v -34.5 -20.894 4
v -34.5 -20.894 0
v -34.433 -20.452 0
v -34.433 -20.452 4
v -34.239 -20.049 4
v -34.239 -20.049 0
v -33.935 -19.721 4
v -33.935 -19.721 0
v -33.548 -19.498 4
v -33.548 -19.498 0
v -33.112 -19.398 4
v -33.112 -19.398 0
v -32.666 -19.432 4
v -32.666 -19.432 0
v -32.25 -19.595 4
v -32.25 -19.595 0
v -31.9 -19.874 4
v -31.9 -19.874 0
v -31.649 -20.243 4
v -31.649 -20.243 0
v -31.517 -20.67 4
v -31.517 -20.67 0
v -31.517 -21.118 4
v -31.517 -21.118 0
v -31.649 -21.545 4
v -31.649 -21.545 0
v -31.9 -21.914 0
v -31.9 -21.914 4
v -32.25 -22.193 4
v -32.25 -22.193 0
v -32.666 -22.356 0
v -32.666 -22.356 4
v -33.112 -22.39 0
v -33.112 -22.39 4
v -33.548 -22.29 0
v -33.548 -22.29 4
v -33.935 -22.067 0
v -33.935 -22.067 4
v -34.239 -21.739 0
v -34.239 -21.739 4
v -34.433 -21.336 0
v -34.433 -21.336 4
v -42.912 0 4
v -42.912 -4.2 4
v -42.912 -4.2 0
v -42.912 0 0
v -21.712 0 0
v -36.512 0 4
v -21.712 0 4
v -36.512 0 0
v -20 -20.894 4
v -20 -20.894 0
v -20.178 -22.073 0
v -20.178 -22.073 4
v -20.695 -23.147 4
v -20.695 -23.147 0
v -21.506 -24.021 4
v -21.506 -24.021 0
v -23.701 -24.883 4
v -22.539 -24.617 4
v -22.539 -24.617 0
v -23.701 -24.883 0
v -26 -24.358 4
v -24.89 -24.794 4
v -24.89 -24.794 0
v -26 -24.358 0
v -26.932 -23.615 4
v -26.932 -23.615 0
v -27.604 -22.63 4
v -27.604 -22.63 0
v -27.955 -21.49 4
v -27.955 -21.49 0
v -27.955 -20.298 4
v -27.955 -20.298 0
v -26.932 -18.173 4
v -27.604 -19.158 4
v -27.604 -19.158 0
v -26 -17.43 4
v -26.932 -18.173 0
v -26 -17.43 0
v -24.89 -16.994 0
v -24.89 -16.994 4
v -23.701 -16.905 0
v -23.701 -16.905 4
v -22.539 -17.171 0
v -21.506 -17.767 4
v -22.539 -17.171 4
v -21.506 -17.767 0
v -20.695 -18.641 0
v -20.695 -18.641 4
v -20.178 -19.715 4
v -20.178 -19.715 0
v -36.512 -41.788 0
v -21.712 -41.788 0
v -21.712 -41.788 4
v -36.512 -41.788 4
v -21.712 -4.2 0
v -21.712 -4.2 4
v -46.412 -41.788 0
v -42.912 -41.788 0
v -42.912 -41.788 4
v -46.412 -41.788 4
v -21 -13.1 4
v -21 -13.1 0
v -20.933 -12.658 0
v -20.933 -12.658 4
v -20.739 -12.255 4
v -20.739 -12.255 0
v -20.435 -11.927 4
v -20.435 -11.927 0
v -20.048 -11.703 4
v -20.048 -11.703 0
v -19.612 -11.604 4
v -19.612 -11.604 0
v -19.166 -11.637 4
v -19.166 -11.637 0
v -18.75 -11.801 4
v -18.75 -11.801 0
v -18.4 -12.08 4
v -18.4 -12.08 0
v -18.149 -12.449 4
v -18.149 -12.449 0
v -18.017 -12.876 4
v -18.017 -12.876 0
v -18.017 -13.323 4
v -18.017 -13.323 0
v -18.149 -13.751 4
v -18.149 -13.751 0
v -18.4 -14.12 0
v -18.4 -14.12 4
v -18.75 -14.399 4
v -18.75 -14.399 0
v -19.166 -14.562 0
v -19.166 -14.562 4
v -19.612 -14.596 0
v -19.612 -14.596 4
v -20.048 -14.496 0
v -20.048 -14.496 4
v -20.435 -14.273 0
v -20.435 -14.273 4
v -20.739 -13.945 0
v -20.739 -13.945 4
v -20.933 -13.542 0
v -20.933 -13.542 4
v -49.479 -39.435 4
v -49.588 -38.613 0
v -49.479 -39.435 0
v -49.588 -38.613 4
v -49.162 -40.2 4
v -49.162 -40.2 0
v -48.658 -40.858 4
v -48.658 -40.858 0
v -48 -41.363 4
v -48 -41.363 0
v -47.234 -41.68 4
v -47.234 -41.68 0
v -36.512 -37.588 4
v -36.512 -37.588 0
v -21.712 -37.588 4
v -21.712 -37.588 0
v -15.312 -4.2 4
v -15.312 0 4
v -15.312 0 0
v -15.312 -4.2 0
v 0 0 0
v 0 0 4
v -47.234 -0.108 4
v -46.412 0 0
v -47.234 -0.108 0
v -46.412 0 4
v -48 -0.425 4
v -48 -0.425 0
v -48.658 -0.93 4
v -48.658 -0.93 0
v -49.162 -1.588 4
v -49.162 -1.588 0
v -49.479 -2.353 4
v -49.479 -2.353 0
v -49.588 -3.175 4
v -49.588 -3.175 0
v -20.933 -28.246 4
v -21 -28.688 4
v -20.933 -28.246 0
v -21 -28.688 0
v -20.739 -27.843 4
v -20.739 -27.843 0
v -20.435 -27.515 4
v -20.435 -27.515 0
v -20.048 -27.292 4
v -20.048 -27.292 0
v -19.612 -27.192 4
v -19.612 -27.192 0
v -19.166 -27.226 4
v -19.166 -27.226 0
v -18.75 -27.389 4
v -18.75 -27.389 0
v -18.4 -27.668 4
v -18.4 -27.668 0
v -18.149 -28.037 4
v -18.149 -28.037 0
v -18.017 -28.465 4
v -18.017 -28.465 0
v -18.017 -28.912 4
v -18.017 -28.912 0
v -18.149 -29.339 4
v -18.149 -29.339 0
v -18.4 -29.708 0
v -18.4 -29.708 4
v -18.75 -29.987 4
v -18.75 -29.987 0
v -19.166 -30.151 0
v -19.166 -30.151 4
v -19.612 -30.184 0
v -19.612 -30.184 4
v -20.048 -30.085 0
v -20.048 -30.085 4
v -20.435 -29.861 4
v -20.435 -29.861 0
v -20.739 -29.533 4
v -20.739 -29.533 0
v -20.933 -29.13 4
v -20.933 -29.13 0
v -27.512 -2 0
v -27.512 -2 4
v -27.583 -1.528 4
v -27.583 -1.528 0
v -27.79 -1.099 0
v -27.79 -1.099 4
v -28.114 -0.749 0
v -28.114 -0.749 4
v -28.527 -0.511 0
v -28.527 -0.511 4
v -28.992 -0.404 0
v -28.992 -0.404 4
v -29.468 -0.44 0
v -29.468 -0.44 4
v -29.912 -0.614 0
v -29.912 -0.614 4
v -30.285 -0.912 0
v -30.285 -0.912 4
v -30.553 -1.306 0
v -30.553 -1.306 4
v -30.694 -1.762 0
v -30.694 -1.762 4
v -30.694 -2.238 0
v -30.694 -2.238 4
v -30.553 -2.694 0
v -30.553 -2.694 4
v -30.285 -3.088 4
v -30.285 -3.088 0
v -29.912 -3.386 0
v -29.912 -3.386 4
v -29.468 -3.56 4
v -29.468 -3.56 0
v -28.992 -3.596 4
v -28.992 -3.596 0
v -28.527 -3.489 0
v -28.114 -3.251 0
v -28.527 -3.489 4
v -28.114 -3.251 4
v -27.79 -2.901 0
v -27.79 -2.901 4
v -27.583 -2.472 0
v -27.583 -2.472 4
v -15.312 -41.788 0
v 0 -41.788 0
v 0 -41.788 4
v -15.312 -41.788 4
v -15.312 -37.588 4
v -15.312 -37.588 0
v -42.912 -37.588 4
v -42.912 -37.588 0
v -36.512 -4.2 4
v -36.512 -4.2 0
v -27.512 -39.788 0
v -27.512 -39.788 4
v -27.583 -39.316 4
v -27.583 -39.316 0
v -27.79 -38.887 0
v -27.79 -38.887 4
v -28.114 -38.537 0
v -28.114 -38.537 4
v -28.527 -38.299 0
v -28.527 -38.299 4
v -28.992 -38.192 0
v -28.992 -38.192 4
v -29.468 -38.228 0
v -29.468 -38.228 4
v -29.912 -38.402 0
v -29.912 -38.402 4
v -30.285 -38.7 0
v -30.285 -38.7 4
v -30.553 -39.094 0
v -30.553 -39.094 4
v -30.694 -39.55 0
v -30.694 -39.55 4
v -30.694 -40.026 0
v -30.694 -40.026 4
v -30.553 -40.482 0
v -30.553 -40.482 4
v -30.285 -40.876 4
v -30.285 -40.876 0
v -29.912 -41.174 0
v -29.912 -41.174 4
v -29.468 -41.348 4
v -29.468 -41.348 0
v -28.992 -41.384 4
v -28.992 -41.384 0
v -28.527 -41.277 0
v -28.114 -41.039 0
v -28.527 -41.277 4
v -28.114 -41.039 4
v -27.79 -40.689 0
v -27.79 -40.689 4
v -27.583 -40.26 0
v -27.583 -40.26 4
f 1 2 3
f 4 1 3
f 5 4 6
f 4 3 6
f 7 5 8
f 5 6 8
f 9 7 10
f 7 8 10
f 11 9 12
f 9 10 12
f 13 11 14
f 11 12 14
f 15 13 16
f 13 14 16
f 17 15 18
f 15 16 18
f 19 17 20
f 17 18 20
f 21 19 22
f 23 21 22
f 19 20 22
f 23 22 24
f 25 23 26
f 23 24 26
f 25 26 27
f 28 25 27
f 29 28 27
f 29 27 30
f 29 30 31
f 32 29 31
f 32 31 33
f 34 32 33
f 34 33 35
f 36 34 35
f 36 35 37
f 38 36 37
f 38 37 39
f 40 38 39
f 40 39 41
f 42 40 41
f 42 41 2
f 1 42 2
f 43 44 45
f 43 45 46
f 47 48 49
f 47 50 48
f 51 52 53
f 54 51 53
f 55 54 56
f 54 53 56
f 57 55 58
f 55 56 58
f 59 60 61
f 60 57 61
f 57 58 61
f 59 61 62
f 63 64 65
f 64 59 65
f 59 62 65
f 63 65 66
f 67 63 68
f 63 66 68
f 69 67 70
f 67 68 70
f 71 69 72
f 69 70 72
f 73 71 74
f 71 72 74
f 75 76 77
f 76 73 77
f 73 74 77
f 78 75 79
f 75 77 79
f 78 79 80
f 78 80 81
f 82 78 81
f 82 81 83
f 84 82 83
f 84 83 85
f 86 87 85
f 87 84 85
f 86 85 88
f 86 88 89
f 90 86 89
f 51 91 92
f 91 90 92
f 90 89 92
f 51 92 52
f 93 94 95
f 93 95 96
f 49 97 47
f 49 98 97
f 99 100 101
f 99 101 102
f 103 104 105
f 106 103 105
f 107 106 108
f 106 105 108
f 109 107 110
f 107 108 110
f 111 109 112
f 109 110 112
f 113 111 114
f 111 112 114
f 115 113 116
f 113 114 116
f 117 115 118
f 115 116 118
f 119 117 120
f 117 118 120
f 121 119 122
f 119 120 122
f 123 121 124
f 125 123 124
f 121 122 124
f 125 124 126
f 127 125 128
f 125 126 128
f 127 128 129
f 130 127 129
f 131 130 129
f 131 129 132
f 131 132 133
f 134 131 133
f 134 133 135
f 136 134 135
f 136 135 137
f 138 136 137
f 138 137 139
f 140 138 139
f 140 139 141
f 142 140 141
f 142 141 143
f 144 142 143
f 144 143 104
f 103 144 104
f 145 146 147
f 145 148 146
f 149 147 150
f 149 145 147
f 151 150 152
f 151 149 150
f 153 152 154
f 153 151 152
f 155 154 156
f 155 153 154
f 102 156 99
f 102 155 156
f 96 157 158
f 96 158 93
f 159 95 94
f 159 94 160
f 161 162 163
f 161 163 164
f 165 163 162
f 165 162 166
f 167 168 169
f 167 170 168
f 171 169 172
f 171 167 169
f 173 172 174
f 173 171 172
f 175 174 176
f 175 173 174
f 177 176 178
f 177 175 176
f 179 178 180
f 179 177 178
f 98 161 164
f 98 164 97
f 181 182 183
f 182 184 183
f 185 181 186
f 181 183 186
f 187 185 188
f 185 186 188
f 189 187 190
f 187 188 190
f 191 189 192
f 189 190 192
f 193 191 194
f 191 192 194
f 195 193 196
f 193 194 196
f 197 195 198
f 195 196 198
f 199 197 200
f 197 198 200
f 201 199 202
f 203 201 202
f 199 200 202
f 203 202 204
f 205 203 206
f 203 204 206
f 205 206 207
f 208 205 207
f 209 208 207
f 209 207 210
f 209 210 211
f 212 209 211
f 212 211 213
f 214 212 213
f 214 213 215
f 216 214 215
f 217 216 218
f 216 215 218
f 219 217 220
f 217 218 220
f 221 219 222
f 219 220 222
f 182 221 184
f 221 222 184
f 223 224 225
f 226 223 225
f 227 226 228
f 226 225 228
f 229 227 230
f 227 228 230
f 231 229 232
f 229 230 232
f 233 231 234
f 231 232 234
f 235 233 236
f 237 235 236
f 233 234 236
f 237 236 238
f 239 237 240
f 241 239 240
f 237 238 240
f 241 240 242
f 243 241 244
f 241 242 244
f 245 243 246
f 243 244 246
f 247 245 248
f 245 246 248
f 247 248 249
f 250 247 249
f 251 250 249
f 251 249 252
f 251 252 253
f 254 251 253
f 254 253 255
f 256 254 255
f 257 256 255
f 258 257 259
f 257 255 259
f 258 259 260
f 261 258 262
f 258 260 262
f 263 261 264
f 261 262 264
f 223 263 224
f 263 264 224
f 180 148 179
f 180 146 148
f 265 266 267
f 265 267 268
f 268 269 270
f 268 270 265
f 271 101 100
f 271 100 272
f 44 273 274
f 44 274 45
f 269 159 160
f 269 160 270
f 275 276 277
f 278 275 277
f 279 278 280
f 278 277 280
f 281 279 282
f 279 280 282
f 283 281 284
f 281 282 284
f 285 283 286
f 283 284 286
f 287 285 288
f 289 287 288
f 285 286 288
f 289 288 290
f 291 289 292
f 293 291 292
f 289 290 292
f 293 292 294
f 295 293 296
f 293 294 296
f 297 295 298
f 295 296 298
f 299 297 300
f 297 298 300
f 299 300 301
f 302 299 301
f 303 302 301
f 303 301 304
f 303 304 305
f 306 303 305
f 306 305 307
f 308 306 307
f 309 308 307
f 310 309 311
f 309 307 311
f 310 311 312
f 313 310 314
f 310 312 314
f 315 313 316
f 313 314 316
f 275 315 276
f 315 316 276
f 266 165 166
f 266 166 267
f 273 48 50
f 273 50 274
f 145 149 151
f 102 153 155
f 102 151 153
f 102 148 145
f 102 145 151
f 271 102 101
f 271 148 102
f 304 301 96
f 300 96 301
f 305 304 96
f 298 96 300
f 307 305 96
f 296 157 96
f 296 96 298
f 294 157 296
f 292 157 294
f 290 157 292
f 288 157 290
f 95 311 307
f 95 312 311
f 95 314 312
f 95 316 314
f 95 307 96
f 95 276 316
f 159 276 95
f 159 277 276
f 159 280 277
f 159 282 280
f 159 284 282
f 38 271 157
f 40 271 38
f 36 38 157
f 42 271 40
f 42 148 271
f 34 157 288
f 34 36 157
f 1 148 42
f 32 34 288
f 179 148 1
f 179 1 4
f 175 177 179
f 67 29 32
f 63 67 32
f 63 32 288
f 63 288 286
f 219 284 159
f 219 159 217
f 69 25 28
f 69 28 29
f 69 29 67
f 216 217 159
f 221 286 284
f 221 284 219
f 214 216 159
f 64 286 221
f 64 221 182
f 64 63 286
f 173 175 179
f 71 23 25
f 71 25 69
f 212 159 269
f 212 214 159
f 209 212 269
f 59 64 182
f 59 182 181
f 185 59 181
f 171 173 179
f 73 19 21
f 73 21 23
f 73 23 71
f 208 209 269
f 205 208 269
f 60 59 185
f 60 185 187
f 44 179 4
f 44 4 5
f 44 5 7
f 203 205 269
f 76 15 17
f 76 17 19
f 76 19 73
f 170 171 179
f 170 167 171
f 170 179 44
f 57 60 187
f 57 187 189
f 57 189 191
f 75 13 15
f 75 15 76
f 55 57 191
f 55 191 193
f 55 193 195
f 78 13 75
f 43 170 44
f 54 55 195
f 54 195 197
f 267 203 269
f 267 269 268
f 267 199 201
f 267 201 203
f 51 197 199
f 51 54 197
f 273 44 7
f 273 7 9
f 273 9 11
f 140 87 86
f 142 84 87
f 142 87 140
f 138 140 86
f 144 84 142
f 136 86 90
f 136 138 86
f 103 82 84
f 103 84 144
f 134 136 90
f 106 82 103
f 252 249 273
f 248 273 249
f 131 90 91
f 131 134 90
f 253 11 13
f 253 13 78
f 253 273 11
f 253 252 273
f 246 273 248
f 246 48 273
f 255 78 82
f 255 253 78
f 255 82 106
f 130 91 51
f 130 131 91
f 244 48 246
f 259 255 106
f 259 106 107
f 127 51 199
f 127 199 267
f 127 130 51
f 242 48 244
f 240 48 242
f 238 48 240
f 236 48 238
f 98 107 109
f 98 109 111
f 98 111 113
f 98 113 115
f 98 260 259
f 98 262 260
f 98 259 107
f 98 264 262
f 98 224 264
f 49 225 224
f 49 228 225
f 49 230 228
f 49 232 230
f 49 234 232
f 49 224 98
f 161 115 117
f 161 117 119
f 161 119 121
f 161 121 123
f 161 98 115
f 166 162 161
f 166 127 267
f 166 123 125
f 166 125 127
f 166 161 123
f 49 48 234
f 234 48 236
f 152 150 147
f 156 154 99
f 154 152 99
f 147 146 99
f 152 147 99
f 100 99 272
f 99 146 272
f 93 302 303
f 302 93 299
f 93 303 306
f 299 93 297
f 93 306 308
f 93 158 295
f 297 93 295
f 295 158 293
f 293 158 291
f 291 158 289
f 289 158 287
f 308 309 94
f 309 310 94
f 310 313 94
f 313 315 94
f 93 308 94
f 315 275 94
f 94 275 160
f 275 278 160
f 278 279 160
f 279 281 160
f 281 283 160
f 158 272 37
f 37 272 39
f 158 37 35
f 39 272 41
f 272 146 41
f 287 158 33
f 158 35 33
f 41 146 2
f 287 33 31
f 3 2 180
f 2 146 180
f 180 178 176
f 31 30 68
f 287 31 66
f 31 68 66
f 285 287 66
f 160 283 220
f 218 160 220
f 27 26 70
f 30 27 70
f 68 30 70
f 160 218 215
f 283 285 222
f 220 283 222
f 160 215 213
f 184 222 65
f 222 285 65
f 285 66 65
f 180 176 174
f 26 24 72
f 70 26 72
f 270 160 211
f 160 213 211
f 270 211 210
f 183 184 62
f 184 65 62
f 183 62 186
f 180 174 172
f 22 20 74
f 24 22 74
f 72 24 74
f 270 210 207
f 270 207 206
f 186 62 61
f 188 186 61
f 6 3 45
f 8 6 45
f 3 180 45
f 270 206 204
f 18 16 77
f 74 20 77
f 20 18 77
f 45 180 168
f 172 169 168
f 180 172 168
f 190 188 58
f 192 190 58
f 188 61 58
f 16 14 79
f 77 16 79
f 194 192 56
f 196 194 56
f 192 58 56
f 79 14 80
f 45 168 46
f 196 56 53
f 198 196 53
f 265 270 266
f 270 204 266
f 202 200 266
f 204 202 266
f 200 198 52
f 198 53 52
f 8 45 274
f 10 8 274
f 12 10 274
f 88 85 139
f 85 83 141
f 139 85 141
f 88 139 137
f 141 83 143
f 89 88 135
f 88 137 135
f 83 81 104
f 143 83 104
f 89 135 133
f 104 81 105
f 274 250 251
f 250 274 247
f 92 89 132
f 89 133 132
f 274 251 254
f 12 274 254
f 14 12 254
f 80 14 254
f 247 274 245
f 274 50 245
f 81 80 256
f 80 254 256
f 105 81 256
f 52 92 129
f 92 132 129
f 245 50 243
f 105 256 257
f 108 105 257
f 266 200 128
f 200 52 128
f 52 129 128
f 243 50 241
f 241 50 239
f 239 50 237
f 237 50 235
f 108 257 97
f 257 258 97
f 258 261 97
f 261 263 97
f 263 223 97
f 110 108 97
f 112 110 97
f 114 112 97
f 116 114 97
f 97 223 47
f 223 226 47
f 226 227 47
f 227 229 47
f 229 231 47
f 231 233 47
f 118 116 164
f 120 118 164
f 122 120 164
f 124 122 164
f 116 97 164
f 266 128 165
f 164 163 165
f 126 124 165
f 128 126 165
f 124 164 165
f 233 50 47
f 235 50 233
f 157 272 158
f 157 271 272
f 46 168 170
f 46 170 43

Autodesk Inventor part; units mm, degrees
ref_plane "YZ Plane" through (0, 0, 0) normal (1, 0, 0) x (0, 1, 0)
ref_plane "XZ Plane" through (0, 0, 0) normal (0, 1, 0) x (-1, 0, 0)
ref_plane "XY Plane" through (0, 0, 0) normal (0, 0, 1) x (1, 0, 0)
sketch "Sketch1" plane through (0, 0, 0) normal (0, 0, 1) x (1, 0, 0)
  line L0 (-49.5875, 0) -> (0, 0)
  line L1 (0, 0) -> (0, -41.788)
  line L2 (0, -41.788) -> (-49.5875, -41.788)
  line L3 (-49.5875, -41.788) -> (-49.5875, 0)
  circle A0 centre (-24, -20.894) radius 3.4749 projected
  circle A1 centre (-24, -20.894) radius 4
  point P0 (0, 0)
  dimension "d0" = 8
extrude "Extrusion1" add sketch "Sketch1" along normal blind 4 contours L0 L1 L2 L3
fillet "Fillet1" radius 3.175 2 edges at (-49.5875, 0, 2) (-49.5875, -41.788, 2)
sketch "Sketch2" plane through (0, 0, 4) normal (0, 0, 1) x (1, 0, 0)
  line L0 (-42.7117, -37.788) -> (-36.7117, -37.788) construction
  line L1 (-42.7117, -37.788) -> (-42.7117, -41.788) construction
  line L2 (-36.7117, -41.788) -> (-42.7117, -41.788) construction
  line L3 (-36.7117, -37.788) -> (-36.7117, -41.788) construction
  line L4 (-21.5117, -37.788) -> (-15.5117, -37.788) construction
  line L5 (-21.5117, -37.788) -> (-21.5117, -41.788) construction
  line L6 (-15.5117, -41.788) -> (-21.5117, -41.788) construction
  line L7 (-15.5117, -37.788) -> (-15.5117, -41.788) construction
  line L8 (-21.5117, 0) -> (-15.5117, 0) construction
  line L9 (-21.5117, 0) -> (-21.5117, -4) construction
  line L10 (-15.5117, -4) -> (-21.5117, -4) construction
  line L11 (-15.5117, 0) -> (-15.5117, -4) construction
  line L12 (-42.7117, 0) -> (-36.7117, 0) construction
  line L13 (-42.7117, 0) -> (-42.7117, -4) construction
  line L14 (-36.7117, -4) -> (-42.7117, -4) construction
  line L15 (-36.7117, 0) -> (-36.7117, -4) construction
  line L16 (-27.4117, -4) -> (-30.8117, -4) construction
  line L17 (-27.4117, 0) -> (-27.4117, -4) construction
  line L18 (-30.8117, 0) -> (-27.4117, 0) construction
  line L19 (-30.8117, 0) -> (-30.8117, -4) construction
  line L20 (-27.4117, -41.788) -> (-30.8117, -41.788) construction
  line L21 (-27.4117, -37.788) -> (-27.4117, -41.788) construction
  line L22 (-30.8117, -37.788) -> (-27.4117, -37.788) construction
  line L23 (-30.8117, -37.788) -> (-30.8117, -41.788) construction
  line L24 (-42.9117, -41.988) -> (-42.9117, -37.588)
  line L25 (-42.9117, -37.588) -> (-36.5117, -37.588)
  line L26 (-36.5117, -37.588) -> (-36.5117, -41.988)
  line L27 (-36.5117, -41.988) -> (-42.9117, -41.988)
  line L28 (-21.7117, -41.988) -> (-21.7117, -37.588)
  line L29 (-21.7117, -37.588) -> (-15.3117, -37.588)
  line L30 (-15.3117, -37.588) -> (-15.3117, -41.988)
  line L31 (-15.3117, -41.988) -> (-21.7117, -41.988)
  line L32 (-42.9117, -4.2) -> (-42.9117, 0.2)
  line L33 (-42.9117, 0.2) -> (-36.5117, 0.2)
  line L34 (-36.5117, 0.2) -> (-36.5117, -4.2)
  line L35 (-36.5117, -4.2) -> (-42.9117, -4.2)
  line L36 (-21.7117, -4.2) -> (-21.7117, 0.2)
  line L37 (-21.7117, 0.2) -> (-15.3117, 0.2)
  line L38 (-15.3117, 0.2) -> (-15.3117, -4.2)
  line L39 (-15.3117, -4.2) -> (-21.7117, -4.2)
  circle A0 centre (-29.1117, -39.788) radius 1.6
  circle A1 centre (-29.1117, -2) radius 1.6
  point P0 (0, 0)
  dimension "d4" = 0.2
  dimension "d5" = 0.2
  dimension "d6" = 0.2
  dimension "d7" = 0.2
  dimension "d8" = 3.2
  dimension "d9" = 3.2
extrude "Extrusion2" cut sketch "Sketch2" against normal blind 4
sketch "Sketch3" plane through (0, 0, 0) normal (0, 0, -1) x (-1, 0, 0)
  circle A0 centre (27.6419, -12.6638) radius 1.5 construction
  circle A1 centre (29.3066, -28.1631) radius 1.5 construction
  circle A2 centre (15.0515, -21.8552) radius 1.5 construction
  circle A3 centre (24, -20.894) radius 3.4749 construction
  circle A4 centre (24, -20.894) radius 9 construction
  circle A5 centre (33, -20.894) radius 1.5
  circle A6 centre (19.5, -28.6882) radius 1.5
  circle A7 centre (19.5, -13.0998) radius 1.5
  point P0 (0, 0)
  dimension "d12" = 3
  dimension "d15" = 360
extrude "Extrusion3" cut sketch "Sketch3" against normal blind 4
properties part number "Wiper nut holder"
